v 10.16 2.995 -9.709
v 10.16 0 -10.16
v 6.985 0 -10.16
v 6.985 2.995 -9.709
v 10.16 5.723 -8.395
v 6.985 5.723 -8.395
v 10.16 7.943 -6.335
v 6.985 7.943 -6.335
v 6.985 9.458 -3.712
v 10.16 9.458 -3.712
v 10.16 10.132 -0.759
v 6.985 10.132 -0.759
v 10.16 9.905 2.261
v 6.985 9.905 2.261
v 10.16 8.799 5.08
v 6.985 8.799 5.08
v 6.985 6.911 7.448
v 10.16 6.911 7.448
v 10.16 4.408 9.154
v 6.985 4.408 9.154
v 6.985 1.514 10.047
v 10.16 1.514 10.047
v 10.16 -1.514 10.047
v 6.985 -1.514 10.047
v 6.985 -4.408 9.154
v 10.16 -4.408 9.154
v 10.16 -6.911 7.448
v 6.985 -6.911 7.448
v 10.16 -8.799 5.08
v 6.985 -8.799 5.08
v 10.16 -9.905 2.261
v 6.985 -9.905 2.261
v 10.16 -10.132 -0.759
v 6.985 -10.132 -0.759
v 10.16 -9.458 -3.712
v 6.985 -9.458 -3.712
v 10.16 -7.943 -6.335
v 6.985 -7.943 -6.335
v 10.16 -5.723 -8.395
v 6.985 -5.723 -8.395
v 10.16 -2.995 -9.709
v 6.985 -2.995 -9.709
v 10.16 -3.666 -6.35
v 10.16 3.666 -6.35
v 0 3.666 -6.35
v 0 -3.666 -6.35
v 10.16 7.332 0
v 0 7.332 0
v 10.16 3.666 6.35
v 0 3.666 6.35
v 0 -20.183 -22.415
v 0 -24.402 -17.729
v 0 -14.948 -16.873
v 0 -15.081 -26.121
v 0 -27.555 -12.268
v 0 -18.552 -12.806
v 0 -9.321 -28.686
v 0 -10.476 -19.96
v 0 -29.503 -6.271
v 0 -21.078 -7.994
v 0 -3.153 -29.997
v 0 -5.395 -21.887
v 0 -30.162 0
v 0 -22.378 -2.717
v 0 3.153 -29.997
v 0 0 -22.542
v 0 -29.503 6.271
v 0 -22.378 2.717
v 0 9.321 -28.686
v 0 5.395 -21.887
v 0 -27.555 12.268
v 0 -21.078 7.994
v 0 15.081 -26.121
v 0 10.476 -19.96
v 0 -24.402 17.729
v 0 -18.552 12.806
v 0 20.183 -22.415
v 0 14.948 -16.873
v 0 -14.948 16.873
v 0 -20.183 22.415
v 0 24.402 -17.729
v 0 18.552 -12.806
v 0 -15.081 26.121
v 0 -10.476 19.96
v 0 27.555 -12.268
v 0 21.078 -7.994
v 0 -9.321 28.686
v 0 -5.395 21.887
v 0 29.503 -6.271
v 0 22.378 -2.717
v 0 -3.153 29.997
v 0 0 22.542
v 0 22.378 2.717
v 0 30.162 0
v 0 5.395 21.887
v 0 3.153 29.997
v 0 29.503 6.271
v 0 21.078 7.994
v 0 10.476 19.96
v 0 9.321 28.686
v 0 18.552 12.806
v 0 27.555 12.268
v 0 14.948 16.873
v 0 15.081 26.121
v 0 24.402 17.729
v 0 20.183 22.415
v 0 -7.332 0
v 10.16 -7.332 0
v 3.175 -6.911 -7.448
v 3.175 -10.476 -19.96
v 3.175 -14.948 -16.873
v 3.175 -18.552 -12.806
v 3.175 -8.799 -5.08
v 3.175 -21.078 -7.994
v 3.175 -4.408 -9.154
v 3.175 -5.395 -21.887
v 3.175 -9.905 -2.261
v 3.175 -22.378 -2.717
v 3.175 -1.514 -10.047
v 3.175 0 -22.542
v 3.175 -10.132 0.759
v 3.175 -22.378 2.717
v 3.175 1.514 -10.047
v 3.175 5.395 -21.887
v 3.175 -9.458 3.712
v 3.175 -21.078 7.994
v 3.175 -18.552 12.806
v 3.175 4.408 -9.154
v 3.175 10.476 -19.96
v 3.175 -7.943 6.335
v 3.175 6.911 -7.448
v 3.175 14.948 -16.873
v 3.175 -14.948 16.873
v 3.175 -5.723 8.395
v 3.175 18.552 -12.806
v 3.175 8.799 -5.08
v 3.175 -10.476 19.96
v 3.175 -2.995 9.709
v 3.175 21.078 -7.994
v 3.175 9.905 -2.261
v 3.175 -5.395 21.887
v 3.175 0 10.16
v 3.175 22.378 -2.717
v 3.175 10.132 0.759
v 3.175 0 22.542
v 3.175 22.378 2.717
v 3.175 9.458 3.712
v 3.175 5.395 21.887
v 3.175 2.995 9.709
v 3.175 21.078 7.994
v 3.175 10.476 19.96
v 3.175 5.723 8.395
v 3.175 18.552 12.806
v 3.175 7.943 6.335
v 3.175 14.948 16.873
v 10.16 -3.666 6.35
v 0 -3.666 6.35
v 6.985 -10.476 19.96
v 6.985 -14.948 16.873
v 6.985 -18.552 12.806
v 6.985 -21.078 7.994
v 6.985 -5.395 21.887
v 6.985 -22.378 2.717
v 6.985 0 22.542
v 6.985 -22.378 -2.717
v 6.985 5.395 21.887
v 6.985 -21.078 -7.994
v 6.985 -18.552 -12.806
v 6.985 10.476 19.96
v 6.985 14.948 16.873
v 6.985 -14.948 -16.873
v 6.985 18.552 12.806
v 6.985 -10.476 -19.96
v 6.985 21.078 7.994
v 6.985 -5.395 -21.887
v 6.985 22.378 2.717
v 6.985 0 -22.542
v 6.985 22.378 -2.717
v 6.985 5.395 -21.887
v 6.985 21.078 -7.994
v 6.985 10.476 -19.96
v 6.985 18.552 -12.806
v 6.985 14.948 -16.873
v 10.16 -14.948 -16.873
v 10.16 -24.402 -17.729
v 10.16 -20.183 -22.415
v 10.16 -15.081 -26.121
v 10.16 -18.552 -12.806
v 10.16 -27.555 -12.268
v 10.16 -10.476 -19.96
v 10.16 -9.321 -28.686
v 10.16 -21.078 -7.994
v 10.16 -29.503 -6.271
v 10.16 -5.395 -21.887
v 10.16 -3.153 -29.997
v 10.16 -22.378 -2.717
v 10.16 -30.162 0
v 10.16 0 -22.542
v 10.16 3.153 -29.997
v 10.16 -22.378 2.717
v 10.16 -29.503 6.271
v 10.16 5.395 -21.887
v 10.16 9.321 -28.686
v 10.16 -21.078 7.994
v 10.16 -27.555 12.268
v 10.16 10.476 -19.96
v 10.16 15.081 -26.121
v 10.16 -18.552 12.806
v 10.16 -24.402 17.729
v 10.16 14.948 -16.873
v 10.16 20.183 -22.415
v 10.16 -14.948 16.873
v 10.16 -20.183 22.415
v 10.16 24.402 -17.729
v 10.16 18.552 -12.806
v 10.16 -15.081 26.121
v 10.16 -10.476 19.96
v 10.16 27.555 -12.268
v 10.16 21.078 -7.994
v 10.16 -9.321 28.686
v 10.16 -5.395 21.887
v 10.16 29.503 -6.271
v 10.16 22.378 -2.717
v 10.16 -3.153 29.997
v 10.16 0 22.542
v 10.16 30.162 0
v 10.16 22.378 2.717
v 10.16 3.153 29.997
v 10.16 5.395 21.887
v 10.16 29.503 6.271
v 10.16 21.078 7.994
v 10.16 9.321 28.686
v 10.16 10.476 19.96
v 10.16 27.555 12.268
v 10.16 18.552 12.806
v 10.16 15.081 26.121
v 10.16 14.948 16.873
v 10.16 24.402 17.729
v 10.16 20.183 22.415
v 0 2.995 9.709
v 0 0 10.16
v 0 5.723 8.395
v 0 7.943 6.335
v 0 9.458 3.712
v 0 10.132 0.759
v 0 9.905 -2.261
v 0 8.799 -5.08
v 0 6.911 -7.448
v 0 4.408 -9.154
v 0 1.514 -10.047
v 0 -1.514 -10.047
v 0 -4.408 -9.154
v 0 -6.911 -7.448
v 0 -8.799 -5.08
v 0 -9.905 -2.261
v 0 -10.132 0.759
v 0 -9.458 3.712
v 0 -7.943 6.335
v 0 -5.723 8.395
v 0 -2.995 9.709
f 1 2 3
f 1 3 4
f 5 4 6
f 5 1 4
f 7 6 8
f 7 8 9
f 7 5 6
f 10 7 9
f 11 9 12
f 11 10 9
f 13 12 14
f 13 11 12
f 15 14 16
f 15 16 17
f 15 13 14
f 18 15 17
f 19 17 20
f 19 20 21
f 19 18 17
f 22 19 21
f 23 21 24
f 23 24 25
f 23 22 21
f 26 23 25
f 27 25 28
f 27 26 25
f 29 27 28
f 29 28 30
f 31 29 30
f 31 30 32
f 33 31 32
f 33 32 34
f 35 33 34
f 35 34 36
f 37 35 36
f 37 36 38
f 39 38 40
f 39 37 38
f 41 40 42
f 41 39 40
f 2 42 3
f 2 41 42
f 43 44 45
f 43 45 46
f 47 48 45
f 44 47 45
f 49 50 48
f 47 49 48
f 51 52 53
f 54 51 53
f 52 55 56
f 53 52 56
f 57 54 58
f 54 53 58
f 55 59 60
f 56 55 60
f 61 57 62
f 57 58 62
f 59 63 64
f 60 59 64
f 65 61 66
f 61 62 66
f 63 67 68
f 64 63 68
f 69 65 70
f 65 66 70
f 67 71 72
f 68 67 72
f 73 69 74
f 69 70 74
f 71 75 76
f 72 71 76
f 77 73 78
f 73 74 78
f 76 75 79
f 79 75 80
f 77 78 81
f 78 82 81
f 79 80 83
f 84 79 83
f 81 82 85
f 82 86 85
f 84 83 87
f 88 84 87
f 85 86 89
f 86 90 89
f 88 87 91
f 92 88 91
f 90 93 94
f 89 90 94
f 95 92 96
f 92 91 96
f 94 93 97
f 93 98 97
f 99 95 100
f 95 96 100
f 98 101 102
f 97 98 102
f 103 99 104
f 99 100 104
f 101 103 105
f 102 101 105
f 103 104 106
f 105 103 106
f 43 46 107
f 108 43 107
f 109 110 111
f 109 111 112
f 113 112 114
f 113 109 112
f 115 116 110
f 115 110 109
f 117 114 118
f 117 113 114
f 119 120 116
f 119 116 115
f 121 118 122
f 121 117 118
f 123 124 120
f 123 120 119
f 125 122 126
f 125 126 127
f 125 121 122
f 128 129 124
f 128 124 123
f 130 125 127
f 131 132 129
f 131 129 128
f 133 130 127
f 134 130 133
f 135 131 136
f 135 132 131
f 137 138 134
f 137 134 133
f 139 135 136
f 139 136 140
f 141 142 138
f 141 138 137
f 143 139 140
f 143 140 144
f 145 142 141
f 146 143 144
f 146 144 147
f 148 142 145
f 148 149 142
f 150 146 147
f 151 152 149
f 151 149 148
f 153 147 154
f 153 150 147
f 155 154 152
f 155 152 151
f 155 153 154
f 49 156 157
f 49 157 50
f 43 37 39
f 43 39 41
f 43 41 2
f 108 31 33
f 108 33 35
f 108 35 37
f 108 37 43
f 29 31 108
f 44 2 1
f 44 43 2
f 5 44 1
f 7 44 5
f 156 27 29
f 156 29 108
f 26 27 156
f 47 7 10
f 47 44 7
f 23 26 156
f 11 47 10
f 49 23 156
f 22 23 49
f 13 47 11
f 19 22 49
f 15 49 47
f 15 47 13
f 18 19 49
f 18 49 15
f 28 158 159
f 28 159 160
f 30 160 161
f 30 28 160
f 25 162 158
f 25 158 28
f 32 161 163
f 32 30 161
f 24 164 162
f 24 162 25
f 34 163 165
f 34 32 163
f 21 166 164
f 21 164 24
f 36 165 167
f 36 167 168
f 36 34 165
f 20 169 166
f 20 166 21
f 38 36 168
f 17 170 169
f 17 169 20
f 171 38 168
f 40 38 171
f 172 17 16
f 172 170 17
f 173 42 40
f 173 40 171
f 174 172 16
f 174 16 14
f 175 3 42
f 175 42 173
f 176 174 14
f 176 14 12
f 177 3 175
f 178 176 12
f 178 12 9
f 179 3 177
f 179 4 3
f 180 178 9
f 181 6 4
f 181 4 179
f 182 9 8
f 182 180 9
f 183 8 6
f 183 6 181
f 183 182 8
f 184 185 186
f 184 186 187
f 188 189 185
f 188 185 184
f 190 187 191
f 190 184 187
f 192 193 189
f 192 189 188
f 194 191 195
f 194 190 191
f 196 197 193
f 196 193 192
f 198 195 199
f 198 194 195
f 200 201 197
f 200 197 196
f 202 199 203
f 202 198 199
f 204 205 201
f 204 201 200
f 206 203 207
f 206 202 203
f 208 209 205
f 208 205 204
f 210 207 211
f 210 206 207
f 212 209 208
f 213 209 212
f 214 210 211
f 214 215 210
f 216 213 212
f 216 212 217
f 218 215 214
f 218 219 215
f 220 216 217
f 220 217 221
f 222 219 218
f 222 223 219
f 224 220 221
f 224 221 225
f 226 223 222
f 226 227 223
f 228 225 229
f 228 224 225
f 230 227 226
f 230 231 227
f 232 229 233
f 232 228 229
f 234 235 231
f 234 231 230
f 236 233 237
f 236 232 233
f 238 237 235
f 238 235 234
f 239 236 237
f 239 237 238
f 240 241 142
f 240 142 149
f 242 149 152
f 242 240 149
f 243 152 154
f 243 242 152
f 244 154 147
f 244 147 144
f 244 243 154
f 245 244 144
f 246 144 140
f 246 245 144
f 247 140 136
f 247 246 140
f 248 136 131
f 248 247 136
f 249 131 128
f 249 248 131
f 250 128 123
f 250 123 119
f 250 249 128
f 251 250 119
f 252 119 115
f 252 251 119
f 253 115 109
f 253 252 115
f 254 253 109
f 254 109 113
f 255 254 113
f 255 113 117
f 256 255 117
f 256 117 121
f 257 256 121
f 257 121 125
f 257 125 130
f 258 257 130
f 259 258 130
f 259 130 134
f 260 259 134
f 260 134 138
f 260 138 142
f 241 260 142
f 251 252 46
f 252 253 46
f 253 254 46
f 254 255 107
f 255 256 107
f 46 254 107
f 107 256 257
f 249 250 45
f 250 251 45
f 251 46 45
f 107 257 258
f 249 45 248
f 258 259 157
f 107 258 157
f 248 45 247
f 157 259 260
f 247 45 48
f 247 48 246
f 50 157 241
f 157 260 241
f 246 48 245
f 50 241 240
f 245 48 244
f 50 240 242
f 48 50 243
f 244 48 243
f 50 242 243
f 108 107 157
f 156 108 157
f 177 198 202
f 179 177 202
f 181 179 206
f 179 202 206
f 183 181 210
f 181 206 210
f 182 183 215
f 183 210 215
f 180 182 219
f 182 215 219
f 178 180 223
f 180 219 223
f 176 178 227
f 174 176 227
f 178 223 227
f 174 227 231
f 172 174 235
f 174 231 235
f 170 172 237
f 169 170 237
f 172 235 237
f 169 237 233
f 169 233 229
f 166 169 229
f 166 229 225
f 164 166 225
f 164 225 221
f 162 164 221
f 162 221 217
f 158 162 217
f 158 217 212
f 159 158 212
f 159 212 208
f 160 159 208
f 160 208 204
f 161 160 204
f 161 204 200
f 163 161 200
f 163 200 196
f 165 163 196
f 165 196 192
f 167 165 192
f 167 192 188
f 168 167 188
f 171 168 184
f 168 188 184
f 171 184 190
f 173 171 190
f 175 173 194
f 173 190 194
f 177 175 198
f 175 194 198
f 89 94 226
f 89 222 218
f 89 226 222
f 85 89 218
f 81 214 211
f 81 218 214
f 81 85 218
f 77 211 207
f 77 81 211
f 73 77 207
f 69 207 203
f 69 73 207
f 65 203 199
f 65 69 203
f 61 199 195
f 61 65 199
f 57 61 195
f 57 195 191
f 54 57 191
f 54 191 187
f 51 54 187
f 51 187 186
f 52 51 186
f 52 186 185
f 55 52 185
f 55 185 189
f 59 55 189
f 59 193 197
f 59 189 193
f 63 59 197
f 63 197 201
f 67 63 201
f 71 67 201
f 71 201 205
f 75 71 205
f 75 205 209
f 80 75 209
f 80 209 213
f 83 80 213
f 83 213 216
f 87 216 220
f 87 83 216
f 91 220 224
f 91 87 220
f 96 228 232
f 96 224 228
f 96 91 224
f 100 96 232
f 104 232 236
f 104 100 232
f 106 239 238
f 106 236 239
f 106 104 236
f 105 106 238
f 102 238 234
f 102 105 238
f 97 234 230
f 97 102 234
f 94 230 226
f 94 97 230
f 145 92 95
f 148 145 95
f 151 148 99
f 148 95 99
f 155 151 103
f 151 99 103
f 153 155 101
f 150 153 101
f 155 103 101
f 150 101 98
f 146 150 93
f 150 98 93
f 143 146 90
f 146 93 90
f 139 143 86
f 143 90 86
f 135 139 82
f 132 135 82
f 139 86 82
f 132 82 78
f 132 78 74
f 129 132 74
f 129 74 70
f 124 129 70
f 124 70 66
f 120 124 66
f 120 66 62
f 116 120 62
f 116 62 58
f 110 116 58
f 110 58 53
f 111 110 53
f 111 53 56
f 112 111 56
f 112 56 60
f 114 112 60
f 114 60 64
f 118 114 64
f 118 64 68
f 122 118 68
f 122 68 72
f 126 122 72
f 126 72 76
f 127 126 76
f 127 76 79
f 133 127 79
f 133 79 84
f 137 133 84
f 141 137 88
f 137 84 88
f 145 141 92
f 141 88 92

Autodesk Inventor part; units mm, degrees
ref_plane "YZ Plane" through (0, 0, 0) normal (1, 0, 0) x (0, 1, 0)
ref_plane "XZ Plane" through (0, 0, 0) normal (0, 1, 0) x (-1, 0, 0)
ref_plane "XY Plane" through (0, 0, 0) normal (0, 0, 1) x (1, 0, 0)
sketch "Sketch1" plane through (0, 0, 0) normal (1, 0, 0) x (0, 1, 0)
  circle A0 centre (0, 0) radius 30.1625
  circle A1 centre (0, 0) radius 10.16 construction
  line L0 (7.3323, 0) -> (3.6662, -6.35)
  line L1 (3.6662, -6.35) -> (-3.6662, -6.35)
  line L2 (-3.6662, -6.35) -> (-7.3323, 0)
  line L3 (-7.3323, 0) -> (-3.6662, 6.35)
  line L4 (-3.6662, 6.35) -> (3.6662, 6.35)
  line L5 (3.6662, 6.35) -> (7.3323, 0)
  dimension "d0" = 60.325
  dimension "d1" = 20.32
  dimension "d2" = 12.7
extrude "Extrusion1" add sketch "Sketch1" along normal blind 10.16
sketch "Sketch2" plane through (10.16, 0, 0) normal (1, 0, 0) x (0, 0, -1)
  circle A0 centre (0, 0) radius 22.5425
  circle A1 centre (0, 0) radius 10.16
  dimension "d5" = 45.085
  dimension "d6" = 20.32
extrude "Extrusion2" cut sketch "Sketch2" against normal blind 3.175
sketch "Sketch3" plane through (0, 0, 0) normal (-1, 0, 0) x (0, 0, 1)
  circle A0 centre (0, 0) radius 10.16
  circle A1 centre (0, 0) radius 22.5425
  dimension "d9" = 20.32
  dimension "d10" = 45.085
extrude "Extrusion3" cut sketch "Sketch3" against normal blind 3.175
properties part number "banebots 400 - 2 3-8 replacement"
